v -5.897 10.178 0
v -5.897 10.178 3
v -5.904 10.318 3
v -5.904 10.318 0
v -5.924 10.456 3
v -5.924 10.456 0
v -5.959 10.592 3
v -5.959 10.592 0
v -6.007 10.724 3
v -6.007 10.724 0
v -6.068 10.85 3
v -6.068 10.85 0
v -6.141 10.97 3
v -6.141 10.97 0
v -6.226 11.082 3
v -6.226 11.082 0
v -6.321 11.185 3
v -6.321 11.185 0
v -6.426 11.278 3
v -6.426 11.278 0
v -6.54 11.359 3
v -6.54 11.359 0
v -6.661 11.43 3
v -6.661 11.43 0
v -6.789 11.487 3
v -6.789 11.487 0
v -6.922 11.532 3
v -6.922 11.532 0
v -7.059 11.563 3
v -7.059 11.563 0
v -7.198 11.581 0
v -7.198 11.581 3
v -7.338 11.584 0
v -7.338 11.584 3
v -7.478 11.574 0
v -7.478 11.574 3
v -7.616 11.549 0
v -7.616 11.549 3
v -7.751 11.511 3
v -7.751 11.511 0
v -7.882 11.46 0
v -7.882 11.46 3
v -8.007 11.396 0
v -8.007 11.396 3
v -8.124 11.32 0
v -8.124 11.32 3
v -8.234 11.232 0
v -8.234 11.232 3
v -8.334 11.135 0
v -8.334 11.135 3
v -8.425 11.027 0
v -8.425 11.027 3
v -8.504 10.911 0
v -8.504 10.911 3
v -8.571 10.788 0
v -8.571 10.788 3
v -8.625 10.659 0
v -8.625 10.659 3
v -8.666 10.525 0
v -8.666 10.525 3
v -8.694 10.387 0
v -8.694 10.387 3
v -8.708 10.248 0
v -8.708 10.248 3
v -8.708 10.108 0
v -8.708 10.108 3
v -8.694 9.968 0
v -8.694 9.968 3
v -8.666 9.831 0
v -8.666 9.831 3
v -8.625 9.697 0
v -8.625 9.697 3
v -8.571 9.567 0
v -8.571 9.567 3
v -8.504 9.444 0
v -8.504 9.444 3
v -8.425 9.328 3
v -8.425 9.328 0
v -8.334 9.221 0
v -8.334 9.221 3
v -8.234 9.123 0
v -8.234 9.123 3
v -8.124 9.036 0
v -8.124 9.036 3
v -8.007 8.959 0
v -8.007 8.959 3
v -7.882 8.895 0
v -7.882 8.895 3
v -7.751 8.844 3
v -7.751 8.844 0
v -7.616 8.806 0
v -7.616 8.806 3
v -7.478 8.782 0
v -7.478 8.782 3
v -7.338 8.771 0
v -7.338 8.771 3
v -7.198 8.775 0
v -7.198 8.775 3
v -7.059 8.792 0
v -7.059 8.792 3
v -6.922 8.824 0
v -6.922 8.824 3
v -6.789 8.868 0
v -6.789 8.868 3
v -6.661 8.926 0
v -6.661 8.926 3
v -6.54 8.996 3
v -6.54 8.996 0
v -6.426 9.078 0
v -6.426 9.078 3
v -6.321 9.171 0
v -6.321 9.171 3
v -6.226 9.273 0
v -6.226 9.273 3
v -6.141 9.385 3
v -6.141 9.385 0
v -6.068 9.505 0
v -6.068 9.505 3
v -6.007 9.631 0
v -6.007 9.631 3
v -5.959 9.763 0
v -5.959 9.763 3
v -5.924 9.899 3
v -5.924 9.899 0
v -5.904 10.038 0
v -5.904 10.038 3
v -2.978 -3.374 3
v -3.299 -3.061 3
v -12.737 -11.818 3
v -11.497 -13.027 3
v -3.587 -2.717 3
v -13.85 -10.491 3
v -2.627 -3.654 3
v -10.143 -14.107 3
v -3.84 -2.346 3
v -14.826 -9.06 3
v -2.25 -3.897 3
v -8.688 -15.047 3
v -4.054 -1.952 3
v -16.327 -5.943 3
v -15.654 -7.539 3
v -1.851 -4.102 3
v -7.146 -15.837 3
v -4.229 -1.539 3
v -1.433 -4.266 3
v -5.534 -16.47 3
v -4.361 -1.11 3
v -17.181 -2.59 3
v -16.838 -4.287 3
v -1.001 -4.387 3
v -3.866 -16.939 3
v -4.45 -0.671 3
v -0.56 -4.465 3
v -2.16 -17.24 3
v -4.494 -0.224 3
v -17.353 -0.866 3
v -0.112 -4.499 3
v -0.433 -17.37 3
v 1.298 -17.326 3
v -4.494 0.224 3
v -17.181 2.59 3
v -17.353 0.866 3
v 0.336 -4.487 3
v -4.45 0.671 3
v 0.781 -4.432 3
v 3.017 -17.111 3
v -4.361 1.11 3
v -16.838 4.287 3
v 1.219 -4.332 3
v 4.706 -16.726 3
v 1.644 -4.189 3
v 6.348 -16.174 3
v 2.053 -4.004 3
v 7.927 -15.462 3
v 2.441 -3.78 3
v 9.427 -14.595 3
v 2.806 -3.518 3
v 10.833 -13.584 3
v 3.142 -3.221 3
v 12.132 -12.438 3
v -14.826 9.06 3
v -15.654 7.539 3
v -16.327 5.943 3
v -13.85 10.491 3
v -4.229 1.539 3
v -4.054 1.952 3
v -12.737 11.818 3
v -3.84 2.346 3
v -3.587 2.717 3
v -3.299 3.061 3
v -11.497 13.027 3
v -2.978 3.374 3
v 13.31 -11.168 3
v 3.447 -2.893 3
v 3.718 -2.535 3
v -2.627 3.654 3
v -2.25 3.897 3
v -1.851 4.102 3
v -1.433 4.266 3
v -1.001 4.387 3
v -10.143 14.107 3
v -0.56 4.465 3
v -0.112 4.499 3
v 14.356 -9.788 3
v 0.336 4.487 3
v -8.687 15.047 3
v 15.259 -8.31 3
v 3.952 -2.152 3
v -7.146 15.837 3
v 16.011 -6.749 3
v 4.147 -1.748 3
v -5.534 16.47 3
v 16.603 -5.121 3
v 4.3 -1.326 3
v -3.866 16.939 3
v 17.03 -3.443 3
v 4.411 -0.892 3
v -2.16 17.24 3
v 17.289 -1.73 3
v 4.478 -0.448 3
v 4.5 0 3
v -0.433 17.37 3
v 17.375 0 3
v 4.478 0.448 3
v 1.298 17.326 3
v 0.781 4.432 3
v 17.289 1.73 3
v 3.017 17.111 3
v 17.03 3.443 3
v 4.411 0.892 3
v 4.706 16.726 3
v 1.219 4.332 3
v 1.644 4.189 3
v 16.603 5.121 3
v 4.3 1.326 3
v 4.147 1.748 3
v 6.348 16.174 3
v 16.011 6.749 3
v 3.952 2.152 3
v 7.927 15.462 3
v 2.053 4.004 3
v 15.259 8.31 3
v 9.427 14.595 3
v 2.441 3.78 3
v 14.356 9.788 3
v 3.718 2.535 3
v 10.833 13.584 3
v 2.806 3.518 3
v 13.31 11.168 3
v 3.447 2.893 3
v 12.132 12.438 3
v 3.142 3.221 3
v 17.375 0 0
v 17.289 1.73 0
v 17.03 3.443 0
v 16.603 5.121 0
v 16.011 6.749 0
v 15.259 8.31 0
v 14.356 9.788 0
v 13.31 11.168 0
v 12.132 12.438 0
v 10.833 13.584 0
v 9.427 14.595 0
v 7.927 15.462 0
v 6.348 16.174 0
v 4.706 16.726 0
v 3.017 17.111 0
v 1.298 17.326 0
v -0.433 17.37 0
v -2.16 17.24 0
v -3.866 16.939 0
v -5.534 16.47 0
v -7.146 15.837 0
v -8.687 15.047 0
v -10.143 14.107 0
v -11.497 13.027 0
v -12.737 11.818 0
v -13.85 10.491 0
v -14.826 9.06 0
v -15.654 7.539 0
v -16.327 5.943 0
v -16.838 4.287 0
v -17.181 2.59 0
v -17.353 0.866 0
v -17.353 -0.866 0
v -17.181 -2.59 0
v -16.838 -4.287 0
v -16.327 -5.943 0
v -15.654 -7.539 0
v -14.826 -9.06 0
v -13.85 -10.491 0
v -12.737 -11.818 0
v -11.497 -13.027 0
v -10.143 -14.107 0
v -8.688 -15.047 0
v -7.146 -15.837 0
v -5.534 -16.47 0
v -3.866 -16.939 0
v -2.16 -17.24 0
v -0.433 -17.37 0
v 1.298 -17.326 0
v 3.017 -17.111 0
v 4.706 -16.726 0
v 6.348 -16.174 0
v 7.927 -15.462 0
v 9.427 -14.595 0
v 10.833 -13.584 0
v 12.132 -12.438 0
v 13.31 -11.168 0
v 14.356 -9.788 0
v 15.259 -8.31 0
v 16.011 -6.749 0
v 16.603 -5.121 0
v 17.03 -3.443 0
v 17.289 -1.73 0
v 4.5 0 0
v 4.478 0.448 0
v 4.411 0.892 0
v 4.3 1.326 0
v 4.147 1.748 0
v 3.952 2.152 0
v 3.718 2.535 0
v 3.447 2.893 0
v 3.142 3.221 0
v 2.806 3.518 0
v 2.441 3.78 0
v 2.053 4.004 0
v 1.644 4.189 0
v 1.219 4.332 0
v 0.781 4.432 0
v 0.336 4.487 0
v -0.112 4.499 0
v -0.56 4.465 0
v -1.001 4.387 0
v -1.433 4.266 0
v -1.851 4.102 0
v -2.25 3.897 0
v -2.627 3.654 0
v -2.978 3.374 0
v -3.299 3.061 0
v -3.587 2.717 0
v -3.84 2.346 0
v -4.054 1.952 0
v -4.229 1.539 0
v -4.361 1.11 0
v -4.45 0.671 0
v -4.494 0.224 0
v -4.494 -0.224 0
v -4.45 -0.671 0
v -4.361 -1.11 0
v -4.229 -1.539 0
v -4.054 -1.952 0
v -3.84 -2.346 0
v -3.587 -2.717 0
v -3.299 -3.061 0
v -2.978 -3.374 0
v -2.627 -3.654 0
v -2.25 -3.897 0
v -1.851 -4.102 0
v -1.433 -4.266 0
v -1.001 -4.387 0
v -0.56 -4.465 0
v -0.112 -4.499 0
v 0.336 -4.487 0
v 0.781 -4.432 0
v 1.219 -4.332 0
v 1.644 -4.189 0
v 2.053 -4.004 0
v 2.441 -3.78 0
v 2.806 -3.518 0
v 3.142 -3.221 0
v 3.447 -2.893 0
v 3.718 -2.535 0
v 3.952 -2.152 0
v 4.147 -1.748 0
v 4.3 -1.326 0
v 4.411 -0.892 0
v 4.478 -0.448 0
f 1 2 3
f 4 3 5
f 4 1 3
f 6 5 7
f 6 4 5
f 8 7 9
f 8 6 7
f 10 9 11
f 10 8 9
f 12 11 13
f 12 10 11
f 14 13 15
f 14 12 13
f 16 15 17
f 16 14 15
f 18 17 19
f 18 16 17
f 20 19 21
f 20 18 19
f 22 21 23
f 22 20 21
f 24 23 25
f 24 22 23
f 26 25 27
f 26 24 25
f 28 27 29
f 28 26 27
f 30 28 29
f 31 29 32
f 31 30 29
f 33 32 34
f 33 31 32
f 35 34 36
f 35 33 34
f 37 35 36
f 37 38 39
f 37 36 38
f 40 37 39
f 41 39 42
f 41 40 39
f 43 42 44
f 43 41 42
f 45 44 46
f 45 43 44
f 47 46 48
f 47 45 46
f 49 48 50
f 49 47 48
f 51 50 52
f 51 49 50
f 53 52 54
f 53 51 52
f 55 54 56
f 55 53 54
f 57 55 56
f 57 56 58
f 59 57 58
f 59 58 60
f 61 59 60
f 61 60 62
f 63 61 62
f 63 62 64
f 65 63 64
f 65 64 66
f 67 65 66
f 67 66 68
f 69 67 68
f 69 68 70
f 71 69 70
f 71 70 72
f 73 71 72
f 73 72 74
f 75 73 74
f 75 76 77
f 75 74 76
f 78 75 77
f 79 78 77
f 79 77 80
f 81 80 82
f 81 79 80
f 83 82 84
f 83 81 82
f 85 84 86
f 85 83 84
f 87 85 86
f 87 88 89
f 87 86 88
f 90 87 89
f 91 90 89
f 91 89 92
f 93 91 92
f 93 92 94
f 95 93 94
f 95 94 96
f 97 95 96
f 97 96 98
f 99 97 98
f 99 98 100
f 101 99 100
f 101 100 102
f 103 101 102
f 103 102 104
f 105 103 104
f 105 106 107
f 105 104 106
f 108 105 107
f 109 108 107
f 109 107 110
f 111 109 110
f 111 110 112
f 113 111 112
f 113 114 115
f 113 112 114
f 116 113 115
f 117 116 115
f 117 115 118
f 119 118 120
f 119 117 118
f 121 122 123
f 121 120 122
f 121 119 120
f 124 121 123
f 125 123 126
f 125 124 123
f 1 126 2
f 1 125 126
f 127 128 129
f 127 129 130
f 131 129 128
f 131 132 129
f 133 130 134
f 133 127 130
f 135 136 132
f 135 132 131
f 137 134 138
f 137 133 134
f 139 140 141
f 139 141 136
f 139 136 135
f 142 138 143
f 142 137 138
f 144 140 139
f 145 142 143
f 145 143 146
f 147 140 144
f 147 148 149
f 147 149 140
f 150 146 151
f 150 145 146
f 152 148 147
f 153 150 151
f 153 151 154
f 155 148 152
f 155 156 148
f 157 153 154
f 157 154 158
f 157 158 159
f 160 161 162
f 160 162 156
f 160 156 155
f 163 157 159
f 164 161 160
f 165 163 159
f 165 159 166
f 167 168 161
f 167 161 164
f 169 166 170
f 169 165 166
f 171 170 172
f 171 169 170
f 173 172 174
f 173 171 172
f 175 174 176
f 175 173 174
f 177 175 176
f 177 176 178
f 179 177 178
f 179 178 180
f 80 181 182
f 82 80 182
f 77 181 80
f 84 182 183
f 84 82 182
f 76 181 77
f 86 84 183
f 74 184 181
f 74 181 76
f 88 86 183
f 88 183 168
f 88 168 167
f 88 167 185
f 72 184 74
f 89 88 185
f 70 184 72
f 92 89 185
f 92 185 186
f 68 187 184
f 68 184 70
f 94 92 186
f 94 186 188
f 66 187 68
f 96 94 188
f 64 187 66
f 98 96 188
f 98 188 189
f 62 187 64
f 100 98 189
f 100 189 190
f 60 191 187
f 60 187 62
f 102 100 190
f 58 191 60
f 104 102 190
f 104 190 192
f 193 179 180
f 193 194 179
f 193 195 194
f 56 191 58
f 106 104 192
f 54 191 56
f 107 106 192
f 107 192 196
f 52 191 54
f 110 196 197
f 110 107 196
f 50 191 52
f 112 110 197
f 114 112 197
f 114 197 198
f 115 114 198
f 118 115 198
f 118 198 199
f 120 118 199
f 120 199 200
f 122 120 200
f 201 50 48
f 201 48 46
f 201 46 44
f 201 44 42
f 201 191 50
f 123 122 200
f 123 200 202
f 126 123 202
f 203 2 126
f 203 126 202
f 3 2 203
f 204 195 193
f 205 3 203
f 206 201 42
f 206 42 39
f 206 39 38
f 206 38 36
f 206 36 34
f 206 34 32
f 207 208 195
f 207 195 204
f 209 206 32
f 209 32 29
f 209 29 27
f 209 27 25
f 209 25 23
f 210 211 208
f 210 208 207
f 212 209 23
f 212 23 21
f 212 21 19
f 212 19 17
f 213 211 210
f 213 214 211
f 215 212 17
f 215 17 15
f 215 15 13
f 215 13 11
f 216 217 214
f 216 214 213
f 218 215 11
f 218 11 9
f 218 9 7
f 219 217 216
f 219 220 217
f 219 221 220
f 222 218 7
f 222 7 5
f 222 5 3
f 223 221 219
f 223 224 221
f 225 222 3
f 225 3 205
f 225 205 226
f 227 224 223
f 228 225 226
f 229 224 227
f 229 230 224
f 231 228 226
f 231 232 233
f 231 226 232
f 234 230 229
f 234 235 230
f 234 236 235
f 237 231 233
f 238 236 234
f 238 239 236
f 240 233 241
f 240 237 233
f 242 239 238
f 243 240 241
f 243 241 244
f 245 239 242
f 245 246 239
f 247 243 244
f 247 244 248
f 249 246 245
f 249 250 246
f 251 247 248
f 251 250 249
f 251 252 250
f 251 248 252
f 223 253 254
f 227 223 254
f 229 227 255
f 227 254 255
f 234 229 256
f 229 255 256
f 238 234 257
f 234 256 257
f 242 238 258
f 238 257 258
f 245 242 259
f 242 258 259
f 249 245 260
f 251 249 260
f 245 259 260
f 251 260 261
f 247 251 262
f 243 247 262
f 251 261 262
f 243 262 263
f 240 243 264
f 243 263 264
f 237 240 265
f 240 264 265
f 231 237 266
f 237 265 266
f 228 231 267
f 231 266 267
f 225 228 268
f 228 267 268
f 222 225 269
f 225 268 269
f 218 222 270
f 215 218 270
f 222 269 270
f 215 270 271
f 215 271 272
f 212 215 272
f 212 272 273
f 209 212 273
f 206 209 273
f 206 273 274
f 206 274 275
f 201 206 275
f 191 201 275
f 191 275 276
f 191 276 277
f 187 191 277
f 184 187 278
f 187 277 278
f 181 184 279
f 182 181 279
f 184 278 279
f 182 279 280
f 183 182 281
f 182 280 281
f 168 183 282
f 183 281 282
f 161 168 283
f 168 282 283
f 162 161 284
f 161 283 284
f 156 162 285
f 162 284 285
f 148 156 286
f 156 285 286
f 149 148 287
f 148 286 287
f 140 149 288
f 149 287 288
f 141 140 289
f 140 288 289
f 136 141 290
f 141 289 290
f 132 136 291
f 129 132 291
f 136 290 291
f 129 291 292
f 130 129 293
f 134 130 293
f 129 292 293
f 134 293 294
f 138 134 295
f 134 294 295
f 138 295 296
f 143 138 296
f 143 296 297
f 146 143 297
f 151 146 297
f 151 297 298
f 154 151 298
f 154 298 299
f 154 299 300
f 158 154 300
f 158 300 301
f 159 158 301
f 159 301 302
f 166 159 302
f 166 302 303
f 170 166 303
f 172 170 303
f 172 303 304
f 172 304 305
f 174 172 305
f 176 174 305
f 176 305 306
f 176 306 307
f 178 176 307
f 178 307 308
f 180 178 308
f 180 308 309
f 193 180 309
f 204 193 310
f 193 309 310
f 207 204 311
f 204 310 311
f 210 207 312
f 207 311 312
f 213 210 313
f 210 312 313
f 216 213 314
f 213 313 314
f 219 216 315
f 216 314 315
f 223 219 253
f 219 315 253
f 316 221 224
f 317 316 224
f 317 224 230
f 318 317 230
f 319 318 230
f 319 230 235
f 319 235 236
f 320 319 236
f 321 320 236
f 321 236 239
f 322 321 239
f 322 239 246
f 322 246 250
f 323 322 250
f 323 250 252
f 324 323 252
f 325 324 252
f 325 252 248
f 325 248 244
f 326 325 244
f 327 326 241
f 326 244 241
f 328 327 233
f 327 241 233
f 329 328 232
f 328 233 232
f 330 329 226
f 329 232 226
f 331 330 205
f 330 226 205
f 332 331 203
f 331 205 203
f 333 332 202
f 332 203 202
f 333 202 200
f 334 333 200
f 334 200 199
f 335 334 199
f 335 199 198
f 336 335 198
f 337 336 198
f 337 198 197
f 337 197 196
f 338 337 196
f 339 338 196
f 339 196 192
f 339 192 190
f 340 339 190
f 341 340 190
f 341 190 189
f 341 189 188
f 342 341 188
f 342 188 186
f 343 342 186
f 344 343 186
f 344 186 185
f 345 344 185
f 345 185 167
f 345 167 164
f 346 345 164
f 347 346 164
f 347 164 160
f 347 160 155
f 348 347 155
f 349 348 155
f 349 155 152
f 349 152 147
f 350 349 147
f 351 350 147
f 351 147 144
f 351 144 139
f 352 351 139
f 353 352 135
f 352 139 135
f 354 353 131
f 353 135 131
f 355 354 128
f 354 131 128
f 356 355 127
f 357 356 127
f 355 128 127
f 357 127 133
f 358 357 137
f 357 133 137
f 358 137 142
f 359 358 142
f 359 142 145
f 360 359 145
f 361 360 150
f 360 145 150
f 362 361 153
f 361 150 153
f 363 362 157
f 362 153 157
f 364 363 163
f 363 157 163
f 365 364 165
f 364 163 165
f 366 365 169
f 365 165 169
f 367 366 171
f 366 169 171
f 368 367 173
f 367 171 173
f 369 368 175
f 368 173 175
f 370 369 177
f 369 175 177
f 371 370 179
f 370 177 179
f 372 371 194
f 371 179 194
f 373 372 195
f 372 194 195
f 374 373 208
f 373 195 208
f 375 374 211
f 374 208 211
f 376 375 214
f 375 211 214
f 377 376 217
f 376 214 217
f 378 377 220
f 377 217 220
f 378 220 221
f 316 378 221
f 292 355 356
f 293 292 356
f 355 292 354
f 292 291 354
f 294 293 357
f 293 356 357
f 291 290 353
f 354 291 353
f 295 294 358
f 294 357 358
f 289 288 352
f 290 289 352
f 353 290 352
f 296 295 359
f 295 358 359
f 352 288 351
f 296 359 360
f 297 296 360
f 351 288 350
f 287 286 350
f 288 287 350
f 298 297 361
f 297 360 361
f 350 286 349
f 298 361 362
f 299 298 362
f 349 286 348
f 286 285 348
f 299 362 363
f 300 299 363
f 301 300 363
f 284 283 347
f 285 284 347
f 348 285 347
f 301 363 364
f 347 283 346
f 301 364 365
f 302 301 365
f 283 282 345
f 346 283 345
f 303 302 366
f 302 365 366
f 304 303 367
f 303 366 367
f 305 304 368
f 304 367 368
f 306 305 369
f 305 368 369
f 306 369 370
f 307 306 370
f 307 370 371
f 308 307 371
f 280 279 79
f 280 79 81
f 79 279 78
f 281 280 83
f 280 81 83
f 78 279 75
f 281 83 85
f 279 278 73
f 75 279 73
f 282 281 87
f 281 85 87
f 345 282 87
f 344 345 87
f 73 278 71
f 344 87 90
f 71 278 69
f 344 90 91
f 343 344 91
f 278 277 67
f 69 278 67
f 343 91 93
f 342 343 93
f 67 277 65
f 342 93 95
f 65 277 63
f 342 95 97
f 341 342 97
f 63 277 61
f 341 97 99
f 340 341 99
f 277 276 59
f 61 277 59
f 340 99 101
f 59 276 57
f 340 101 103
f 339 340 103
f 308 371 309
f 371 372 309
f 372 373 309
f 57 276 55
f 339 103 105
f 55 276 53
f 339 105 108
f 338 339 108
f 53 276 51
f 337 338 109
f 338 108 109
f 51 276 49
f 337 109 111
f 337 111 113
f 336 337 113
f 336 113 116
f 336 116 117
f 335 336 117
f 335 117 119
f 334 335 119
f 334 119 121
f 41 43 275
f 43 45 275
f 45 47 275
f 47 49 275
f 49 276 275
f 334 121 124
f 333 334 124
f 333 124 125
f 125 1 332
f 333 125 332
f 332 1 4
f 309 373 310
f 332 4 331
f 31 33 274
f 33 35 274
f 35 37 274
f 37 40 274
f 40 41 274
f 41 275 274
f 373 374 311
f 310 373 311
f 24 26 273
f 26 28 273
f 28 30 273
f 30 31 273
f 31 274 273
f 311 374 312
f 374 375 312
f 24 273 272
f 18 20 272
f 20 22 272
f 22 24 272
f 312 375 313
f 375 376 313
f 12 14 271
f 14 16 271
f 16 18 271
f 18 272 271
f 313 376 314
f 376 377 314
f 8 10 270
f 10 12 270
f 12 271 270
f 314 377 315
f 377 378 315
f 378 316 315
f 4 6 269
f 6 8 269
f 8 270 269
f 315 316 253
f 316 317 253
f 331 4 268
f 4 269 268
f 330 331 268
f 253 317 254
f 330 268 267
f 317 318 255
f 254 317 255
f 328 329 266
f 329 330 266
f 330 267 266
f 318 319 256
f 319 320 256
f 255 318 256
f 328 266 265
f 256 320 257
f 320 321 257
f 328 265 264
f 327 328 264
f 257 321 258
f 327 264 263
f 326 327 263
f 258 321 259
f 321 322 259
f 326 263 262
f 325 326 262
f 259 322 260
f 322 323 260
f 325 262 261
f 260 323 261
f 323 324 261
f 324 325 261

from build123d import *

# Parameters (mm, degrees)
F0_R     = 17.375
F1_DEPTH = 3
F2_R     = 4.5
F3_DEPTH = 25.4
F4_R     = 1.406737
F5_DEPTH = 25


with BuildPart() as f1:
    # F0 (on Top) → F1 (new body)
    with BuildSketch(Plane.XY):
        Circle(F0_R)
    extrude(amount=F1_DEPTH)

    # F2 (on face) → F3 (cut)
    with BuildSketch(Plane.XY.offset(3)):
        Circle(F2_R)
    extrude(amount=-F3_DEPTH, mode=Mode.SUBTRACT)

    # F4 (on Top) → F5 (cut)
    with BuildSketch(Plane.XY):
        with Locations((-7.30325, 10.177708)):
            Circle(F4_R)
    extrude(amount=F5_DEPTH, mode=Mode.SUBTRACT)


solid = f1.part
